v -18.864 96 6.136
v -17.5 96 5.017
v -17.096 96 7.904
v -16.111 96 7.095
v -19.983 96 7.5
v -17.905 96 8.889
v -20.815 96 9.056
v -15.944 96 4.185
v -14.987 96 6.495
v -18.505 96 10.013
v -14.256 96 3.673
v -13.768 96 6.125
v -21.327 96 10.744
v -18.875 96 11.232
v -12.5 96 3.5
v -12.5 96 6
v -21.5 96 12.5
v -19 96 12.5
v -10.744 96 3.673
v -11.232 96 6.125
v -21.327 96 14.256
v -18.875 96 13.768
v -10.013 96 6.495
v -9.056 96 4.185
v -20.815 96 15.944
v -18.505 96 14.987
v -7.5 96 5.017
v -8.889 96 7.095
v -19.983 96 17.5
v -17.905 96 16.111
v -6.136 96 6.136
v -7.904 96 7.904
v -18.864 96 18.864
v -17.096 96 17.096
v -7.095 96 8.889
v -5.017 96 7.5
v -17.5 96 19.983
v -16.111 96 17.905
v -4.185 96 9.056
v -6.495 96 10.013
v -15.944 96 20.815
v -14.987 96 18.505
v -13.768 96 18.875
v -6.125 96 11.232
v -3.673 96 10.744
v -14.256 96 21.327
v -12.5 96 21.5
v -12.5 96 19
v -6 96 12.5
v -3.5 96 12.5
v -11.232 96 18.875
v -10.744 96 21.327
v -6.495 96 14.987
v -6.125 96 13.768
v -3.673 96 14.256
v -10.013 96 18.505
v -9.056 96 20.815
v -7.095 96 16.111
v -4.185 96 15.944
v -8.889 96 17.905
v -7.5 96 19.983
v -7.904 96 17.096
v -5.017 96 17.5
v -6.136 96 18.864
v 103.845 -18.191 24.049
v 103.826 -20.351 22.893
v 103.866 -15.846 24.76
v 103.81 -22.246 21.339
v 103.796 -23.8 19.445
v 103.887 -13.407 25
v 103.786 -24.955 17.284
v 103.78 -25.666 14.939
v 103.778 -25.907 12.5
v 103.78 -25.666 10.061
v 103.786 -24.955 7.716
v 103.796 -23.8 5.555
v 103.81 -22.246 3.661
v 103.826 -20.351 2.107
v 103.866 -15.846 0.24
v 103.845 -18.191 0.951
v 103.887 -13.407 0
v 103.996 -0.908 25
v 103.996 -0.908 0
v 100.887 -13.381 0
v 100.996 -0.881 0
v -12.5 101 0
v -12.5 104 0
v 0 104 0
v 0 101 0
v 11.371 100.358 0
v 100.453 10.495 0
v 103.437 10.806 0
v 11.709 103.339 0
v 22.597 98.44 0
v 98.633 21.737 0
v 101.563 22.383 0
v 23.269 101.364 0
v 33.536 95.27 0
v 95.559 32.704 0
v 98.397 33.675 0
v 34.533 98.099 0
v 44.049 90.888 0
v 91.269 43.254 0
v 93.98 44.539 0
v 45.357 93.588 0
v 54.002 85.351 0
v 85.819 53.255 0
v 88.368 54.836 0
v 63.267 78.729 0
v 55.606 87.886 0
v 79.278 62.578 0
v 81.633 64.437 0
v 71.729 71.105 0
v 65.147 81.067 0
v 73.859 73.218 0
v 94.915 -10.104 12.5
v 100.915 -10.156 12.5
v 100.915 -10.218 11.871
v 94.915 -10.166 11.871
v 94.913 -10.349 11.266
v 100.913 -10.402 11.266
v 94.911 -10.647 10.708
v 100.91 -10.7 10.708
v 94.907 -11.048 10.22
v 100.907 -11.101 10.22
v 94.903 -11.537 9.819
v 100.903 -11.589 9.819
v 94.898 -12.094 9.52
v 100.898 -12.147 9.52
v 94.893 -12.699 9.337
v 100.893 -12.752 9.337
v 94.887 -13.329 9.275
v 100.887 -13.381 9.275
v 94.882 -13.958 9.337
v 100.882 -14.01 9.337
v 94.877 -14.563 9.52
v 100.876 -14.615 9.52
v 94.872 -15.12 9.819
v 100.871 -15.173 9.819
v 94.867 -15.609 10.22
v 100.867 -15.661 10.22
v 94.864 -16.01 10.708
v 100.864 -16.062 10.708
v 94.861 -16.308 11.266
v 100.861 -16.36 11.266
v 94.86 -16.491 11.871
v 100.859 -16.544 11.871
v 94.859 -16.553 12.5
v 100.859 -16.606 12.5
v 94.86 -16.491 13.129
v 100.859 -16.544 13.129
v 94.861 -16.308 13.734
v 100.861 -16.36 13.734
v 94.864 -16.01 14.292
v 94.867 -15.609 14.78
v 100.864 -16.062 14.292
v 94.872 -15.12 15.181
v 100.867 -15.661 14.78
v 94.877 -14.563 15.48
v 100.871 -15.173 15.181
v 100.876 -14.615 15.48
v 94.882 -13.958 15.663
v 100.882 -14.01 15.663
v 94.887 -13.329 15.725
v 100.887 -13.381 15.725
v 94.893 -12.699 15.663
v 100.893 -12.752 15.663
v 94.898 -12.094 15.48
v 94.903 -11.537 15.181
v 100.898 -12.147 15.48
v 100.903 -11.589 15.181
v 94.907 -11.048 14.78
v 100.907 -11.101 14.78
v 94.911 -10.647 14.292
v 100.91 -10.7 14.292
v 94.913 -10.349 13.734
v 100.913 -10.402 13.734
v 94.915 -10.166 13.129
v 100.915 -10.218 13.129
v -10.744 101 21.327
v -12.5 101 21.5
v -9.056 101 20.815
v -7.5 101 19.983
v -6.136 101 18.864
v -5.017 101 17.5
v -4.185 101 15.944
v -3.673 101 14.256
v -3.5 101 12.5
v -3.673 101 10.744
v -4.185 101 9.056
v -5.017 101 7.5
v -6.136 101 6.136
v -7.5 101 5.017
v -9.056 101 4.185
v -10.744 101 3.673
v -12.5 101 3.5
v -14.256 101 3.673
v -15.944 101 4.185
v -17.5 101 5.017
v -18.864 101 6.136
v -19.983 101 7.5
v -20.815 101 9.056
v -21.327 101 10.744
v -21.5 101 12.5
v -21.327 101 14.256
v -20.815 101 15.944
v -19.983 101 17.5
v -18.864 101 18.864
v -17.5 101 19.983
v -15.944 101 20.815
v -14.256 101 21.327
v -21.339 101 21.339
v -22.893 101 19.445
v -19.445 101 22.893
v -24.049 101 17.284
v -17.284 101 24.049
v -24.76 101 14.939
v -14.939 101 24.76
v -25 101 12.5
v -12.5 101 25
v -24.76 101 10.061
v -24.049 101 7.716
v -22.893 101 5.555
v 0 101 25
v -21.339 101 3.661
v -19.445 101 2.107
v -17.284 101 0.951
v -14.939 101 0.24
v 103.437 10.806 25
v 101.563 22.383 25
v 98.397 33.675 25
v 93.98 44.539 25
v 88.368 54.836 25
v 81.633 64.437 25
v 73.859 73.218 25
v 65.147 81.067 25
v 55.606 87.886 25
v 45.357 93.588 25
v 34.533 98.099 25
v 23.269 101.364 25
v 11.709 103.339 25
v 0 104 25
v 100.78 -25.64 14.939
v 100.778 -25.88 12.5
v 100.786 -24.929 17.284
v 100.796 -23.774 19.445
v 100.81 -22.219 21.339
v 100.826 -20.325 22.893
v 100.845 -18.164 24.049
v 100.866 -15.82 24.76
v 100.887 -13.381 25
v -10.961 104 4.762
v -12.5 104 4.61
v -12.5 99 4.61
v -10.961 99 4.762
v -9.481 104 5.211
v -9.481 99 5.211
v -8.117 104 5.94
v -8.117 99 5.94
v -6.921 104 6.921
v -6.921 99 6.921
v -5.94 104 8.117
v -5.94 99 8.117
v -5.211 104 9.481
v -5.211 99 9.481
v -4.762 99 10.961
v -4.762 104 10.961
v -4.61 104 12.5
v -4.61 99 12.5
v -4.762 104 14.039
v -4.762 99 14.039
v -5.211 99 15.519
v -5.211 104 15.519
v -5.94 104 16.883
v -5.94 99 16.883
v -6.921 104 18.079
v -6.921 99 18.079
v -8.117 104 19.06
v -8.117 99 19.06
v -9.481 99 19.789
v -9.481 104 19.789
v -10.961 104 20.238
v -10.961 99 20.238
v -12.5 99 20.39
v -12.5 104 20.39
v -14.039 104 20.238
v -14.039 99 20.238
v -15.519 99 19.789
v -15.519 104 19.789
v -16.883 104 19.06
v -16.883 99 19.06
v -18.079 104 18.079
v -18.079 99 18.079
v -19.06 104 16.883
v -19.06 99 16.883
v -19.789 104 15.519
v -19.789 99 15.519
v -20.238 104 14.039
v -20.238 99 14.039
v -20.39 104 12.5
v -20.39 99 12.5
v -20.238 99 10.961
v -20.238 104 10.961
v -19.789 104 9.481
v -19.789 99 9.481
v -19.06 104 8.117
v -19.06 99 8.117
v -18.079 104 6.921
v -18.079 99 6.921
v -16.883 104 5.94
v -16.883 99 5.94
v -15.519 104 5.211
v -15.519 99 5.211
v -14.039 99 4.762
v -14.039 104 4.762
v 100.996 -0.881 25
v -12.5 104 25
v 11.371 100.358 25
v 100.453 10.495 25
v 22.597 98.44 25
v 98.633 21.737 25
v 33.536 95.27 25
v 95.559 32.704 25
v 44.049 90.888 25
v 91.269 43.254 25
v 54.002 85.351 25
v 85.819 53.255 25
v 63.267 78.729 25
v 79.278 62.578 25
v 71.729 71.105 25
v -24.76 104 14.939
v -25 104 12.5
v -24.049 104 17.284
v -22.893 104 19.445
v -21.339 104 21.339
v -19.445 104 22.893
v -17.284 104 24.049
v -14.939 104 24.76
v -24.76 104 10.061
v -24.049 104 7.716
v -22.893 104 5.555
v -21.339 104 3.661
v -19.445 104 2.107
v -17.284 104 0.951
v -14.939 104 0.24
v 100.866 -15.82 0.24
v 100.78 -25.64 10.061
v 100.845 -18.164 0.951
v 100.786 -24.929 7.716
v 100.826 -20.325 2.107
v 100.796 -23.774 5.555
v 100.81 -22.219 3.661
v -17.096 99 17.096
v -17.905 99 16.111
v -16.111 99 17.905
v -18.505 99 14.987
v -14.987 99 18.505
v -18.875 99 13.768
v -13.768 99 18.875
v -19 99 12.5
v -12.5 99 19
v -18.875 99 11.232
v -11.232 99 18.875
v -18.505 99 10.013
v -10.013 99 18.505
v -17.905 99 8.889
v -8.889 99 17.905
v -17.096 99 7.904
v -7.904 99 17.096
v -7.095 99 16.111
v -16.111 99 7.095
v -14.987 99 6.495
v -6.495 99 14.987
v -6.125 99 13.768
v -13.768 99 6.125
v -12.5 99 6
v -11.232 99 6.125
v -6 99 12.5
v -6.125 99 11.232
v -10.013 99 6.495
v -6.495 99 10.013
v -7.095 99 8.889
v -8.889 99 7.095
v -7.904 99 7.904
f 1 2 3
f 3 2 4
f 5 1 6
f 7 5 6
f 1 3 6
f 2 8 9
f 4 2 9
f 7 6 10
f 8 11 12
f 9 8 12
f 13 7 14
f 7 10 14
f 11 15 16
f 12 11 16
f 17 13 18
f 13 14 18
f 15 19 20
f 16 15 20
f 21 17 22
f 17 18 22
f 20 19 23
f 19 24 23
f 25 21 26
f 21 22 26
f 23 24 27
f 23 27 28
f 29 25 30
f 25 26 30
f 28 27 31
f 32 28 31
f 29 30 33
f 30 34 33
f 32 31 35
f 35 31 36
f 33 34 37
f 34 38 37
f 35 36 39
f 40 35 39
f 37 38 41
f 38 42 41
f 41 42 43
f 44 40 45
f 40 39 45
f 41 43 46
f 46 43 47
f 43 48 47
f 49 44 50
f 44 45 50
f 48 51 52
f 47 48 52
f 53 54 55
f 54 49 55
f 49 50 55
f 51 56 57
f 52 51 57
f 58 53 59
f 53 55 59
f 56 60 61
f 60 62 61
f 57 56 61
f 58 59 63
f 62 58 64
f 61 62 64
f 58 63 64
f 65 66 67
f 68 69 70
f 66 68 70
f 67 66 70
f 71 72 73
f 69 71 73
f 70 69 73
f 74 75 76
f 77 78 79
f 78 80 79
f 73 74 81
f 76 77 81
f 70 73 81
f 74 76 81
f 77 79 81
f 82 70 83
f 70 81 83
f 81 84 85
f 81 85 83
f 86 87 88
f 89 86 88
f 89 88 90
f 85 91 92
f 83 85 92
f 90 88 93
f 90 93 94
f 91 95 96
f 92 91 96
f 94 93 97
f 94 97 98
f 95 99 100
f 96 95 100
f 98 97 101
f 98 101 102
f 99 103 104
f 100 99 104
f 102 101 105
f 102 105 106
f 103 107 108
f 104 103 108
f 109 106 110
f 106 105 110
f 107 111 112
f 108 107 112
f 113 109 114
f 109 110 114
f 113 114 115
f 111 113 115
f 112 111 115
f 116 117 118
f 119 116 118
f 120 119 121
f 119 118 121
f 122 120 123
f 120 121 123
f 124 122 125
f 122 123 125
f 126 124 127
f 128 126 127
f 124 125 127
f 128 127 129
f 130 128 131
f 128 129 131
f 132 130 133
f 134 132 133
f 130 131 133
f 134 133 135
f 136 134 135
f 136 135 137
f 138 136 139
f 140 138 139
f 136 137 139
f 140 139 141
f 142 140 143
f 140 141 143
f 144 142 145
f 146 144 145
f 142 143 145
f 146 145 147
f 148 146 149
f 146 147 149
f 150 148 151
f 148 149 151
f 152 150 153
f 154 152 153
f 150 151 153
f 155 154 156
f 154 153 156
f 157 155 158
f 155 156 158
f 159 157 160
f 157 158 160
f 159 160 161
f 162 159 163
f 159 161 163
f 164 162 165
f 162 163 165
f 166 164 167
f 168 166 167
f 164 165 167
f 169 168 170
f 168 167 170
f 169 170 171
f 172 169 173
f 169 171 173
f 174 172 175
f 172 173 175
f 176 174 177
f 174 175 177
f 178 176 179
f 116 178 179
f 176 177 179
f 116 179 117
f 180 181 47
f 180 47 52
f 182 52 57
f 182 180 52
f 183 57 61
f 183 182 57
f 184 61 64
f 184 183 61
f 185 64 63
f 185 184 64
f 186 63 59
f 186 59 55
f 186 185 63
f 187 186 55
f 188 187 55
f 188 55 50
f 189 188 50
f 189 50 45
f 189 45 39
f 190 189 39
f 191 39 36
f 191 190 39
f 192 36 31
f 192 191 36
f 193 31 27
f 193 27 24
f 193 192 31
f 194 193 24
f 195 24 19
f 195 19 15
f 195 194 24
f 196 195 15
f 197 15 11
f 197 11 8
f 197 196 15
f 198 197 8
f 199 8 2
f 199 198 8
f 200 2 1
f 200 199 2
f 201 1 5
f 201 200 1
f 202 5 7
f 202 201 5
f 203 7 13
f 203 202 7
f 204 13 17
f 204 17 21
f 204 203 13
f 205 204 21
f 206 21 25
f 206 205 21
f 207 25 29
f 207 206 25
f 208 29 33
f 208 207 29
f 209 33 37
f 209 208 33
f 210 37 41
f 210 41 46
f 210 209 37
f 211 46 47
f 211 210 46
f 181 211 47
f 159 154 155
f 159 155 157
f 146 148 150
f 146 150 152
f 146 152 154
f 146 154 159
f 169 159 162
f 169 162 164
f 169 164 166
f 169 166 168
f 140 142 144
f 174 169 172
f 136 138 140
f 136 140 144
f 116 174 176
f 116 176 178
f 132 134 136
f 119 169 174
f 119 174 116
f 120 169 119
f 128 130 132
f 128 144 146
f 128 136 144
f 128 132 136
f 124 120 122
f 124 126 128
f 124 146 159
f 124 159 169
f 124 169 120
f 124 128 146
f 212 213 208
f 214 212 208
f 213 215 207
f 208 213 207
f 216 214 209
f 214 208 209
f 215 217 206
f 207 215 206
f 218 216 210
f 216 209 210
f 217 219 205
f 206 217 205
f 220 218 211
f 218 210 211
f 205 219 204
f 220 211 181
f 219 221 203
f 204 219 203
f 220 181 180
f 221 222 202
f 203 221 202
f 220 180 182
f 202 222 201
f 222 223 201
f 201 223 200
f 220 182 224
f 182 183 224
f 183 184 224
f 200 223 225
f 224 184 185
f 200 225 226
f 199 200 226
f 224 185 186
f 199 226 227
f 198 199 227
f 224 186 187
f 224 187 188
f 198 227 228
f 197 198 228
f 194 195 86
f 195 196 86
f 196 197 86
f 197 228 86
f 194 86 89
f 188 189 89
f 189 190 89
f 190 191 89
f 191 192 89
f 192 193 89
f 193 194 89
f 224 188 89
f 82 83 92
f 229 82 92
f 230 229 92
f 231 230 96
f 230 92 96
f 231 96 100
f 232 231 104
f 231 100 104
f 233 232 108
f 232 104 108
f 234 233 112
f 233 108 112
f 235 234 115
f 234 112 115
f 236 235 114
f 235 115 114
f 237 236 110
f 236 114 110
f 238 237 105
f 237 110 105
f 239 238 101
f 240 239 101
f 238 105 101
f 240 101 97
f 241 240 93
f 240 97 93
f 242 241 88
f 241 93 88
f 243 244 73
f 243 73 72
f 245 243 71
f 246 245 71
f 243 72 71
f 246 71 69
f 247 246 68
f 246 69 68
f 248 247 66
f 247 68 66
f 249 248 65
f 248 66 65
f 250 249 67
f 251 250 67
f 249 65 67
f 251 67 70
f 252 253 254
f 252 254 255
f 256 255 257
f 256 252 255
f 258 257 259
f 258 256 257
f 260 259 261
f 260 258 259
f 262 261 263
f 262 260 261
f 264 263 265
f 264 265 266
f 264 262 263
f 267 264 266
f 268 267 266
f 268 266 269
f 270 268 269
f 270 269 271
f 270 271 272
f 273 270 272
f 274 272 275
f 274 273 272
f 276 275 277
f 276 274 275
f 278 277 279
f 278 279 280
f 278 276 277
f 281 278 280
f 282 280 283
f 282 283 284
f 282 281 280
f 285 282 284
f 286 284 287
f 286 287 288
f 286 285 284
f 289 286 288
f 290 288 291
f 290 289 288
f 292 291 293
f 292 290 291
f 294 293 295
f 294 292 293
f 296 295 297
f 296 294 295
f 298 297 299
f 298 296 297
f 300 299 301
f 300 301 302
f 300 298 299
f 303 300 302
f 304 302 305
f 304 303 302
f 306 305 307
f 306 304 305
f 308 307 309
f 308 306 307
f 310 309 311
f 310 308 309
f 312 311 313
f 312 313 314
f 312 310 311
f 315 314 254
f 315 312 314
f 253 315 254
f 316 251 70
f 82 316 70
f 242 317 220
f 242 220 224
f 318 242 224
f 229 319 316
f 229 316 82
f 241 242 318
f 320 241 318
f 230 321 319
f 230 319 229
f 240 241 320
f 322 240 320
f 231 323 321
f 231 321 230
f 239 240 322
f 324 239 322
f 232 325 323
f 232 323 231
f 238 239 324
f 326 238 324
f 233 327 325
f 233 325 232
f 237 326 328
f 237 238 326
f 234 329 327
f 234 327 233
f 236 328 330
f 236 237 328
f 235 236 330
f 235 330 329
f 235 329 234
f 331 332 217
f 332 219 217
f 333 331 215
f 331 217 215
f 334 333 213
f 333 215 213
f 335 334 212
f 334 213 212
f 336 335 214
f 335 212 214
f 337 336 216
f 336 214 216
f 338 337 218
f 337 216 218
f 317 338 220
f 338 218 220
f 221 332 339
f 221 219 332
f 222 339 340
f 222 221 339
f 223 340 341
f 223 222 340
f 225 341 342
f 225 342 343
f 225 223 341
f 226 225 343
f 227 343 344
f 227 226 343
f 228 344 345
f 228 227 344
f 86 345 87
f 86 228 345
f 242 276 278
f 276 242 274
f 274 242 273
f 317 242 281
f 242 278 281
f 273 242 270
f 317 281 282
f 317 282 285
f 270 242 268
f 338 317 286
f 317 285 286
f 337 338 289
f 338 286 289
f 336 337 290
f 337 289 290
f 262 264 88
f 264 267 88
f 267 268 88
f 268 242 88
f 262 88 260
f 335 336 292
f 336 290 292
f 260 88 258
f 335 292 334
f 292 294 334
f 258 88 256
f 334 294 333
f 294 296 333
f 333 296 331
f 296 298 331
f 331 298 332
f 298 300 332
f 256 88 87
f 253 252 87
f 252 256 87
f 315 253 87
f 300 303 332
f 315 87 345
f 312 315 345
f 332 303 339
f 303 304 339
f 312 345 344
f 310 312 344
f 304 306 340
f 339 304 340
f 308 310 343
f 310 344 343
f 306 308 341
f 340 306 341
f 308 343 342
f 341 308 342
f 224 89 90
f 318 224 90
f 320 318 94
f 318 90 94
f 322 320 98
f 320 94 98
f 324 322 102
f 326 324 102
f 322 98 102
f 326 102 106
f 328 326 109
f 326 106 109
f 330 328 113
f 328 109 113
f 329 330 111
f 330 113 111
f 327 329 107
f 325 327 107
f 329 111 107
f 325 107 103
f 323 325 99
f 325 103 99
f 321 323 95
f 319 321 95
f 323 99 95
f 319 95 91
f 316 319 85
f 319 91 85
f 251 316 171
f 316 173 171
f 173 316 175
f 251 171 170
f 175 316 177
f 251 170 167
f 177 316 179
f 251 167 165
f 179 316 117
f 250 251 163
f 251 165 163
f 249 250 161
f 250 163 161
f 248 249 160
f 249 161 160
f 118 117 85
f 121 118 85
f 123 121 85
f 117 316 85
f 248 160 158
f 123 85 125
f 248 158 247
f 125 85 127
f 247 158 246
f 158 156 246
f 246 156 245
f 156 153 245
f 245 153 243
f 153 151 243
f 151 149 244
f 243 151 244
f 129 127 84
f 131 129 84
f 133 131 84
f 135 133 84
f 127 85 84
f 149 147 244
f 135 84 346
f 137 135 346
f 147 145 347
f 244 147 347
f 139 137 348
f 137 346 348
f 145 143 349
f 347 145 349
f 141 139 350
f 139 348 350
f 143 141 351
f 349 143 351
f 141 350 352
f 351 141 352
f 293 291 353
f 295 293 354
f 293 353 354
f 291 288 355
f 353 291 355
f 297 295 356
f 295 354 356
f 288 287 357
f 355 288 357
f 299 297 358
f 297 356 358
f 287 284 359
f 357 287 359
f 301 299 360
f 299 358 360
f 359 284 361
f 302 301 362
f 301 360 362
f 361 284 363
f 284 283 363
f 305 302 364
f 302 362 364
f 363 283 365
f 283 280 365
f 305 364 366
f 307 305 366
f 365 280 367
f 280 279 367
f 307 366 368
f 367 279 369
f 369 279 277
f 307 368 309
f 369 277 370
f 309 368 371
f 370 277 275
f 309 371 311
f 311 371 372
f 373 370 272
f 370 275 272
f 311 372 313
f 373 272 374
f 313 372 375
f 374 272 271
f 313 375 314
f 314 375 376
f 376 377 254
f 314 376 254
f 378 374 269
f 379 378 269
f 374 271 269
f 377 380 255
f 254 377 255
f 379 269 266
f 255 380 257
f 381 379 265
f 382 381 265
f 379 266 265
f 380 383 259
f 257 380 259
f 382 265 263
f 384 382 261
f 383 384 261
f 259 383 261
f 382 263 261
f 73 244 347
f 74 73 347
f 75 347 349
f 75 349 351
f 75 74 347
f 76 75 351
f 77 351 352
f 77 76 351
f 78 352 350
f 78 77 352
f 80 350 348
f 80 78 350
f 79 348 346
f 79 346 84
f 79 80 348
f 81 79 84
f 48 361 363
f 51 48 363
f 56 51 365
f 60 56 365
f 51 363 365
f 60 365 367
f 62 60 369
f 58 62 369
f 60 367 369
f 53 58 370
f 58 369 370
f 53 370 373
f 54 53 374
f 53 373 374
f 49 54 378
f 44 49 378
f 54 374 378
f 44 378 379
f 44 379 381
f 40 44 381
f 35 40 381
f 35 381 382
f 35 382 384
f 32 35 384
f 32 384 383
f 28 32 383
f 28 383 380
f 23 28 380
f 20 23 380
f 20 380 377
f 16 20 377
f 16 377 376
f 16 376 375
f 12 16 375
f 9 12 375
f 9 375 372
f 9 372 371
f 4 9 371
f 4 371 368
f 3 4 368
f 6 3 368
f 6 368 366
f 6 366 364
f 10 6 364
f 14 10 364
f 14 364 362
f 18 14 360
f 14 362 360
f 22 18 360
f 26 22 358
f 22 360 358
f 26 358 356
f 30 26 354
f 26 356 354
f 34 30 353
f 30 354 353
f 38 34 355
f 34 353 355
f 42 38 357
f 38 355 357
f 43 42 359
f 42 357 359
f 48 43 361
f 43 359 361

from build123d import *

# Parameters (mm, degrees)
BOSS_EXTRUDE1_DEPTH = 25
FILLET1_R           = 12.5
SKETCH4_R           = 3.225
BOSS_EXTRUDE2_DEPTH = 6
SKETCH6_R           = 9
SKETCH6_R_2         = 6.5
BOSS_EXTRUDE3_DEPTH = 5
SKETCH5_R           = 7.89
CUT_EXTRUDE1_DEPTH  = 5


with BuildPart() as part:
    # Sketch2 → Boss-Extrude1 (new body)
    with BuildSketch(Plane.XY):
        with BuildLine():
            Line((0, 104), (-25, 104))
            Line((-25, 104), (-25, 101))
            Line((-25, 101), (0, 101))
            ThreePointArc((0, 101), (71.728722938, 71.10548717), (100.996154229, -0.881380085))
            Line((100.996154229, -0.881380085), (100.777990842, -25.880428162))
            Line((100.777990842, -25.880428162), (103.777876611, -25.906607768))
            Line((103.777876611, -25.906607768), (103.996039999, -0.907559692))
            ThreePointArc((103.996039999, -0.907559692), (73.859279065, 73.217531343), (0, 104))
        make_face()
    extrude(amount=BOSS_EXTRUDE1_DEPTH)

    # Fillet1
    fillet1_edges = [part.edges().sort_by_distance(p)[0] for p in [
        (102.277933727, -25.893517965, 0),
        (102.277933727, -25.893517965, 25),
        (-25, 102.5, 25),
        (-25, 102.5, 0),
    ]]
    fillet(fillet1_edges, radius=FILLET1_R - 0.0001)  # a hair under: the kernel refuses the full size

    # Sketch4 → Boss-Extrude2 (add)
    with BuildSketch(Plane(origin=(100.996154229, -0.881380085, 0), x_dir=(0, 0, 1), z_dir=(-0.9999619230641714, 0.008726535498377326, 0))):
        with Locations(Location((12.5, -12.5, 0), (0, 0, 90))):
            Circle(SKETCH4_R)
    extrude(amount=BOSS_EXTRUDE2_DEPTH)

    # Sketch6 → Boss-Extrude3 (add)
    with BuildSketch(Plane(origin=(0, 101, 0), x_dir=(1, 0, 0), z_dir=(0, 1, 0))):
        with Locations(Location((-12.5, -12.5, 0), (0, 0, 270))):
            Circle(SKETCH6_R)
        with Locations(Location((-12.5, -12.5, 0), (0, 0, 270))):
            Circle(SKETCH6_R_2, mode=Mode.SUBTRACT)
    extrude(amount=-BOSS_EXTRUDE3_DEPTH)

    # Sketch5 → Cut-Extrude1 (cut)
    with BuildSketch(Plane.XZ.offset(-104)):
        with Locations(Location((-12.5, 12.5, 0), (0, 0, 270))):
            Circle(SKETCH5_R)
    extrude(amount=CUT_EXTRUDE1_DEPTH, mode=Mode.SUBTRACT)


solid = part.part
